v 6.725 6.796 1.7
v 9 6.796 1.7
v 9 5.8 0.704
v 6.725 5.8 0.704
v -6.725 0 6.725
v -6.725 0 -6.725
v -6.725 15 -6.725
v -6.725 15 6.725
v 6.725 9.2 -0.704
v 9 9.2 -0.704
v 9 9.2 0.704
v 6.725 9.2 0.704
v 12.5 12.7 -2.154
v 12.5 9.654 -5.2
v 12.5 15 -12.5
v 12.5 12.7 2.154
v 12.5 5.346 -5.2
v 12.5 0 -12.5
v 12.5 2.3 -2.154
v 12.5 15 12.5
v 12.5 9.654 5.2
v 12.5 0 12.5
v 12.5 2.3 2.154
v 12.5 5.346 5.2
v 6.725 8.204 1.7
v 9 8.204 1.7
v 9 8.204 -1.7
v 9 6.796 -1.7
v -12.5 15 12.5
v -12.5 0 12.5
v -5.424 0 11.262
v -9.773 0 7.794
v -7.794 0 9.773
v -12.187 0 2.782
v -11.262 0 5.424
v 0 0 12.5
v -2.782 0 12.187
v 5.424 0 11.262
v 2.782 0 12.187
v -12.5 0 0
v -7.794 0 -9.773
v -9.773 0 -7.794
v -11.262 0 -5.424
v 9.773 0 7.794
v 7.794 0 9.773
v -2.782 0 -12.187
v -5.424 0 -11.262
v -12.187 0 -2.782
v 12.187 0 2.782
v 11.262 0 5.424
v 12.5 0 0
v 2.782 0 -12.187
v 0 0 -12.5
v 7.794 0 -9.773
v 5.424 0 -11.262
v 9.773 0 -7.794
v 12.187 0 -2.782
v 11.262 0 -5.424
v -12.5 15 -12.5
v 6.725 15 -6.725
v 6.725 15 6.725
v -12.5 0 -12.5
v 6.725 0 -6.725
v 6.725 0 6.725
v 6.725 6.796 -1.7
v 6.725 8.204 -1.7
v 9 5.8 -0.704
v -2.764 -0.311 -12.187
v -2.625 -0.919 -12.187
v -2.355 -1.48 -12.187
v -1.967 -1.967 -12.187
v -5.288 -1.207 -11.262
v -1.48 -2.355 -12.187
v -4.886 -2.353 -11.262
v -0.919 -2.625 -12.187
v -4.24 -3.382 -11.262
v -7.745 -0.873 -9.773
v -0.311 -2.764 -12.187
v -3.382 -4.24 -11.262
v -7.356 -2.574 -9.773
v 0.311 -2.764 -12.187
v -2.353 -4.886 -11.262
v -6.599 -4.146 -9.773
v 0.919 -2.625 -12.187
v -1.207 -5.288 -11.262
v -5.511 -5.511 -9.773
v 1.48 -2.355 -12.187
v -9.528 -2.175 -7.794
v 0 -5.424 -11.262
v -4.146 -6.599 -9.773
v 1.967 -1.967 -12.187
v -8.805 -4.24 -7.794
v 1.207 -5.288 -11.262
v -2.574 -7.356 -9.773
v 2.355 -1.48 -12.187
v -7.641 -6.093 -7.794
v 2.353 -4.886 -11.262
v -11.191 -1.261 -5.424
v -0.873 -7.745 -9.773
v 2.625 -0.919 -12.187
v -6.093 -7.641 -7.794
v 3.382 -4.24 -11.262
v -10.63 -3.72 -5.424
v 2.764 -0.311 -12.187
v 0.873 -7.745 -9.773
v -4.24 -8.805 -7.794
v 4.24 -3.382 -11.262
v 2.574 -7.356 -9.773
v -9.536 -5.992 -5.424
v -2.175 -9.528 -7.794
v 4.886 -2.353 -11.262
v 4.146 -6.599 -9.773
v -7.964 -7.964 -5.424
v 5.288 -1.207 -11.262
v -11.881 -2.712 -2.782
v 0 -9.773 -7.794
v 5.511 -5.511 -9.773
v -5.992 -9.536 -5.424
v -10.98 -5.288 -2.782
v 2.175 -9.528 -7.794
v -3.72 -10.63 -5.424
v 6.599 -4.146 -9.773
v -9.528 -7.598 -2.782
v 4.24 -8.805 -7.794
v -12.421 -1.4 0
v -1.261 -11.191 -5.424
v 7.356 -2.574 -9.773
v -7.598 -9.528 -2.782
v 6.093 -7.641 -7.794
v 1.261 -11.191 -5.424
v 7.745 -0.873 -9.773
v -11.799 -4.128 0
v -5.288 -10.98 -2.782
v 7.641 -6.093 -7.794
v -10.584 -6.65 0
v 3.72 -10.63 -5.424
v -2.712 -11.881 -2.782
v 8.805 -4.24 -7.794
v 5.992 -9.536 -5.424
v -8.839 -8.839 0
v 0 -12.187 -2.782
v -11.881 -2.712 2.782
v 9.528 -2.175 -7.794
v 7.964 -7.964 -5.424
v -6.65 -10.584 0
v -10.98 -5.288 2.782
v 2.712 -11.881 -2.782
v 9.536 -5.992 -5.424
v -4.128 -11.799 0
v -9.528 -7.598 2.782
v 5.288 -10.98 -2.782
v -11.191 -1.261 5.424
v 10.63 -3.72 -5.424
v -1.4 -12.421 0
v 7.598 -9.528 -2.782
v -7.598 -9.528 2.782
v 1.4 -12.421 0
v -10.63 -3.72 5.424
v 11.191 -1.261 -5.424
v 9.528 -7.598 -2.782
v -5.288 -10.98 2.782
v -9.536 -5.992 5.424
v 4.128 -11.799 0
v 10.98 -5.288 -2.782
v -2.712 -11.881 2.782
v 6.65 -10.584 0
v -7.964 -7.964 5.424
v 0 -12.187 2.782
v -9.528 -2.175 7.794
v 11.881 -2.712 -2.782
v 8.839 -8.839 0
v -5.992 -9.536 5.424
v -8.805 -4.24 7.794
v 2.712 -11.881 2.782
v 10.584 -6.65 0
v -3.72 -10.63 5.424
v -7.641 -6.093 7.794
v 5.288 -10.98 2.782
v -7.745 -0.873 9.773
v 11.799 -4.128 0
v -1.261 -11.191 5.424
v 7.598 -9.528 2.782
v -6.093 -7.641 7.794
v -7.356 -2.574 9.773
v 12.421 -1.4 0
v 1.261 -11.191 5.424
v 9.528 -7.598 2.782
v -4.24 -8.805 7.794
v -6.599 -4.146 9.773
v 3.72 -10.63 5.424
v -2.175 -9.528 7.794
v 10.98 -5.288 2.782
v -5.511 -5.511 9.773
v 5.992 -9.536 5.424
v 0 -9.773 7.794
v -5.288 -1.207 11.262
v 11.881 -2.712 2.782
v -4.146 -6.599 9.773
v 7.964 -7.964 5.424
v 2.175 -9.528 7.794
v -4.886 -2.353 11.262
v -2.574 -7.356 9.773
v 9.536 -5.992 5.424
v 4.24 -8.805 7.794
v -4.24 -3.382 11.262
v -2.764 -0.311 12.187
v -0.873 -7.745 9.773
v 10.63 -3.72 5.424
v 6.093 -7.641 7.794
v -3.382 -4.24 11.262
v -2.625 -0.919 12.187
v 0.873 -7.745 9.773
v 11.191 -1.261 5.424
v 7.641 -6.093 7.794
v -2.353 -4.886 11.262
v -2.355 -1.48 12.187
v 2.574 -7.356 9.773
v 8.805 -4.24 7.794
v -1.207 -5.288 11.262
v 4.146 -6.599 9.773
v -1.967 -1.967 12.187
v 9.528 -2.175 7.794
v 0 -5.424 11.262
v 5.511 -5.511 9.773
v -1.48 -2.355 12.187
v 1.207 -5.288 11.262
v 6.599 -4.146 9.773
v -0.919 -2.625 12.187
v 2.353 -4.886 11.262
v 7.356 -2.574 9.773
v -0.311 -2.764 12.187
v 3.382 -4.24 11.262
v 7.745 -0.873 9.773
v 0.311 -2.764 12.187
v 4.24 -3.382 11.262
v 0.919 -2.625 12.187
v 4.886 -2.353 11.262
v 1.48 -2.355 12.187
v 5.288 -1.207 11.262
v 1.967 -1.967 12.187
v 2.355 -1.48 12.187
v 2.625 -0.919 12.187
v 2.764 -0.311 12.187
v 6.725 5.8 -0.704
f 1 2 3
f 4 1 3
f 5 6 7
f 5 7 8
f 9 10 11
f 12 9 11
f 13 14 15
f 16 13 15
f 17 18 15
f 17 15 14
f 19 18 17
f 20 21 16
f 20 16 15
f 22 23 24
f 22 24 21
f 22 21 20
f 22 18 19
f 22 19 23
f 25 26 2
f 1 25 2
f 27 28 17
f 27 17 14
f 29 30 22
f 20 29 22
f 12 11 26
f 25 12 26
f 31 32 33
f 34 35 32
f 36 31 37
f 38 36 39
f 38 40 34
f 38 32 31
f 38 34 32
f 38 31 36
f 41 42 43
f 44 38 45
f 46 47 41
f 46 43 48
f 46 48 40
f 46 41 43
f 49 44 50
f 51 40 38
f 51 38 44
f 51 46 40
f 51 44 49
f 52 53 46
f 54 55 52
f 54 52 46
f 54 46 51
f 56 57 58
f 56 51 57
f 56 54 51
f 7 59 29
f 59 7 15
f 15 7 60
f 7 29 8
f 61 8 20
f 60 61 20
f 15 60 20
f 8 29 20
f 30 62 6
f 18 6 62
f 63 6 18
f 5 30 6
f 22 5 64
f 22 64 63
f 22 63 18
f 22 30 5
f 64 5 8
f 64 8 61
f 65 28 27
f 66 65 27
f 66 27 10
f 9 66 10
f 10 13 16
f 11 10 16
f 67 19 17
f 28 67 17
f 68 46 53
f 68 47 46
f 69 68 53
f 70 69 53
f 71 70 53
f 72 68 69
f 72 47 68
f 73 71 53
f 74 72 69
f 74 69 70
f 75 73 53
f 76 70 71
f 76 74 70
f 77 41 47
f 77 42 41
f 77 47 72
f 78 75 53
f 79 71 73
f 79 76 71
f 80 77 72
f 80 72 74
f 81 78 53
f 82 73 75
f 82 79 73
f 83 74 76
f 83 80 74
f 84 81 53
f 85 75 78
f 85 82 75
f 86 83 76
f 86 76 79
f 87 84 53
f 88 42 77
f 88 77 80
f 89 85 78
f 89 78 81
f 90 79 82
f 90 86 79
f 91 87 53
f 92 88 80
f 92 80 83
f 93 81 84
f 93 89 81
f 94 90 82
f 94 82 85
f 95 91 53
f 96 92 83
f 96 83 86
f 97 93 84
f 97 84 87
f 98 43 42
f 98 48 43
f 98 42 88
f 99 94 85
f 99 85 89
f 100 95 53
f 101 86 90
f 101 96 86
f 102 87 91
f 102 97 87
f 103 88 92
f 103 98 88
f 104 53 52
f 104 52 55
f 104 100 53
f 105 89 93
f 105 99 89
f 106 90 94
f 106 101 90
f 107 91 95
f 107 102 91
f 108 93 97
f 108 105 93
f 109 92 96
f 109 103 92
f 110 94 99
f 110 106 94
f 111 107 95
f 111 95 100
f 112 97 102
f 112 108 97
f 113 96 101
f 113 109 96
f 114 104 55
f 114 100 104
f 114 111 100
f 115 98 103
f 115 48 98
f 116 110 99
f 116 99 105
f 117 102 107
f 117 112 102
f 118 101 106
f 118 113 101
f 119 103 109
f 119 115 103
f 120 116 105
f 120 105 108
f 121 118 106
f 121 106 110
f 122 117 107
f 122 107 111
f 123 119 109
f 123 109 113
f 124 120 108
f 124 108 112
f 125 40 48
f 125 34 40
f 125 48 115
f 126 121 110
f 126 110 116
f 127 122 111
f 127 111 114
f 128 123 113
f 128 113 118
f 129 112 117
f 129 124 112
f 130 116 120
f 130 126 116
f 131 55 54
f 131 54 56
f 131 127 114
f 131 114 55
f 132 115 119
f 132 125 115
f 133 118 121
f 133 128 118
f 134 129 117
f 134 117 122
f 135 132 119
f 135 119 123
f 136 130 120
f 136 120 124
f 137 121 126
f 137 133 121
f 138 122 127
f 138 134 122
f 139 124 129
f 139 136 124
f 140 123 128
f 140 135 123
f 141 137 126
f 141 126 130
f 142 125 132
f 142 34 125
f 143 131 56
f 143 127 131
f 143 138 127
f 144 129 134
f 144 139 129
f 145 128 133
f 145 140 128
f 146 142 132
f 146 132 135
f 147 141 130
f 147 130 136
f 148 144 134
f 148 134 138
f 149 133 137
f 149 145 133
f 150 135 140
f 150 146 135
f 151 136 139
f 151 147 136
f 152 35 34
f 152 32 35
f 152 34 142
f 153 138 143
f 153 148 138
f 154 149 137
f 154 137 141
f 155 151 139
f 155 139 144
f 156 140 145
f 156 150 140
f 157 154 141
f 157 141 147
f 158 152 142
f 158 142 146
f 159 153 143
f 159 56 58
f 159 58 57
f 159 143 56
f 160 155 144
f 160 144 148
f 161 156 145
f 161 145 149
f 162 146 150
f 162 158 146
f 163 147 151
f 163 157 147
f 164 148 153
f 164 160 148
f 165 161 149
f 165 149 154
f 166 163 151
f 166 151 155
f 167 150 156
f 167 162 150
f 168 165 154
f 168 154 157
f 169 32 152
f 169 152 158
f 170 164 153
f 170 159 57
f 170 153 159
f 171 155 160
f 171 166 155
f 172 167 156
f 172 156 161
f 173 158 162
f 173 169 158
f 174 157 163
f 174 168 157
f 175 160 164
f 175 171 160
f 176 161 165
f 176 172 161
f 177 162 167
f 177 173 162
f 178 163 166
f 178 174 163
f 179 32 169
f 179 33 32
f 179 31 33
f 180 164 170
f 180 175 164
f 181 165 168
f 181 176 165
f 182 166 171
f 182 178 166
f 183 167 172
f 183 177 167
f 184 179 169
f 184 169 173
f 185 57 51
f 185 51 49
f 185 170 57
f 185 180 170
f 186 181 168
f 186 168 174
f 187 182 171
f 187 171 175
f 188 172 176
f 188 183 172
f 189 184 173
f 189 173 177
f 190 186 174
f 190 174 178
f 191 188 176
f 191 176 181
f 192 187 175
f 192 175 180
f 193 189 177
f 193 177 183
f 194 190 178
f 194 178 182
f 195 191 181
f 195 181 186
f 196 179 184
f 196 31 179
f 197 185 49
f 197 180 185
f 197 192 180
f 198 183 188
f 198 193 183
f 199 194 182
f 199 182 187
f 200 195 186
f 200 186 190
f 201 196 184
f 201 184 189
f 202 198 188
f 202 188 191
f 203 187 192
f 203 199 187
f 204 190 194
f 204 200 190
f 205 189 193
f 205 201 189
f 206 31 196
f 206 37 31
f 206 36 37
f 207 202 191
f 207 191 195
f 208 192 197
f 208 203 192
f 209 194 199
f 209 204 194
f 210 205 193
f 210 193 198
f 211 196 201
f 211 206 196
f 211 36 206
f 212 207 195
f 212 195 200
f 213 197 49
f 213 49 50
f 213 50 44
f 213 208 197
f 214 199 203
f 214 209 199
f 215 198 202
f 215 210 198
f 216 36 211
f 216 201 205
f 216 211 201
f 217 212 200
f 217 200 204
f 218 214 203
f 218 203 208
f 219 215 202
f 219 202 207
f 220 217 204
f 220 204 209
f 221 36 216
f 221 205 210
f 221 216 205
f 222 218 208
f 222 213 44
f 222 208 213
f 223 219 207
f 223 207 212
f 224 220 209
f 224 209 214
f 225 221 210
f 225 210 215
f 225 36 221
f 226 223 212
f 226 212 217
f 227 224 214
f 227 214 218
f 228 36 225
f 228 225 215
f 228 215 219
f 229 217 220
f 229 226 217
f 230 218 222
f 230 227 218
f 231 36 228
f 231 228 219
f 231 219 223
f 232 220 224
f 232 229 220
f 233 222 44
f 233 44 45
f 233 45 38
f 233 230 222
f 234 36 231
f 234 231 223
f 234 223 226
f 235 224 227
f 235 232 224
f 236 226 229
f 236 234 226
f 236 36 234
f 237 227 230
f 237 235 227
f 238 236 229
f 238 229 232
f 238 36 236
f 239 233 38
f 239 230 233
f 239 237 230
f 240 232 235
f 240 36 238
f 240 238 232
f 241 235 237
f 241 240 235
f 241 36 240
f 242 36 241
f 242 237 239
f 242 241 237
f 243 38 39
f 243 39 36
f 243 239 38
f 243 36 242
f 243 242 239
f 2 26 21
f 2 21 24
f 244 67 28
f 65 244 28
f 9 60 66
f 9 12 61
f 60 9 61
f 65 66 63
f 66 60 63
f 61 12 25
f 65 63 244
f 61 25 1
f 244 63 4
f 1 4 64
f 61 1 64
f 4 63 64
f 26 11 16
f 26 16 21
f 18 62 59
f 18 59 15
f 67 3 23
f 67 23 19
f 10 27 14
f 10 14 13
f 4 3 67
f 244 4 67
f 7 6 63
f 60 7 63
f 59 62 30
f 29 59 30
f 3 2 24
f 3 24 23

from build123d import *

# Parameters (mm, degrees)
BOX_W        = 30
BOX_H        = 30
BOX_DEPTH    = 30
SKETCH_W     = 25
SKETCH_H     = 25
SKETCH_W_2   = 13.45
SKETCH_H_2   = 13.45
PAD_DEPTH    = 15
POCKET_DEPTH = 6
CHAMFER_SIZE = 3.5


with BuildPart() as cube:
    # Box → Box (new body)
    with BuildSketch(Plane(origin=(-15, 0, -15), x_dir=(1, 0, 0), z_dir=(0, 0, 1))):
        with Locations((15, 15)):
            Rectangle(BOX_W, BOX_H)
    extrude(amount=BOX_DEPTH)


with BuildPart() as cut:
    # Sphere → Sphere (revolve)
    with BuildSketch(Plane.XZ):
        with BuildLine():
            ThreePointArc((0, -12.5), (12.5, 0), (0, 12.5))
            Line((0, 12.5), (0, -12.5))
        make_face()
    revolve(axis=Axis((0, 0, 0), (0, 0, 1)))

    # Cut: cut Cube
    add(cube.part, mode=Mode.SUBTRACT)


with BuildPart() as body:
    # Sketch → Pad (new body)
    with BuildSketch(Plane.XZ):
        Rectangle(SKETCH_W, SKETCH_H)
        Rectangle(SKETCH_W_2, SKETCH_H_2, mode=Mode.SUBTRACT)
    extrude(amount=-PAD_DEPTH)

    # Sketch001 (on Face4 of Pad) → Pocket (cut)
    with BuildSketch(Plane(origin=(12.5, 0, 0), x_dir=(0, 0, 1), z_dir=(1, 0, 0))):
        Polygon((1.7, -8.204163), (1.7, -6.795837), (0.704163, -5.8), (-0.704163, -5.8), (-1.7, -6.795837), (-1.7, -8.204163), (-0.704163, -9.2), (0.704163, -9.2), align=None)
    extrude(amount=-POCKET_DEPTH, mode=Mode.SUBTRACT)

    # Chamfer
    chamfer_edges = [body.edges().sort_by_distance(p)[0] for p in [
        (12.5, 6.297918, 1.202082),
        (12.5, 7.5, 1.7),
        (12.5, 8.702082, 1.202082),
        (12.5, 9.2, 0),
        (12.5, 8.702082, -1.202082),
        (12.5, 7.5, -1.7),
        (12.5, 6.297918, -1.202082),
        (12.5, 5.8, 0),
    ]]
    chamfer(chamfer_edges, length=CHAMFER_SIZE)


solid = Compound([cut.part, body.part])
